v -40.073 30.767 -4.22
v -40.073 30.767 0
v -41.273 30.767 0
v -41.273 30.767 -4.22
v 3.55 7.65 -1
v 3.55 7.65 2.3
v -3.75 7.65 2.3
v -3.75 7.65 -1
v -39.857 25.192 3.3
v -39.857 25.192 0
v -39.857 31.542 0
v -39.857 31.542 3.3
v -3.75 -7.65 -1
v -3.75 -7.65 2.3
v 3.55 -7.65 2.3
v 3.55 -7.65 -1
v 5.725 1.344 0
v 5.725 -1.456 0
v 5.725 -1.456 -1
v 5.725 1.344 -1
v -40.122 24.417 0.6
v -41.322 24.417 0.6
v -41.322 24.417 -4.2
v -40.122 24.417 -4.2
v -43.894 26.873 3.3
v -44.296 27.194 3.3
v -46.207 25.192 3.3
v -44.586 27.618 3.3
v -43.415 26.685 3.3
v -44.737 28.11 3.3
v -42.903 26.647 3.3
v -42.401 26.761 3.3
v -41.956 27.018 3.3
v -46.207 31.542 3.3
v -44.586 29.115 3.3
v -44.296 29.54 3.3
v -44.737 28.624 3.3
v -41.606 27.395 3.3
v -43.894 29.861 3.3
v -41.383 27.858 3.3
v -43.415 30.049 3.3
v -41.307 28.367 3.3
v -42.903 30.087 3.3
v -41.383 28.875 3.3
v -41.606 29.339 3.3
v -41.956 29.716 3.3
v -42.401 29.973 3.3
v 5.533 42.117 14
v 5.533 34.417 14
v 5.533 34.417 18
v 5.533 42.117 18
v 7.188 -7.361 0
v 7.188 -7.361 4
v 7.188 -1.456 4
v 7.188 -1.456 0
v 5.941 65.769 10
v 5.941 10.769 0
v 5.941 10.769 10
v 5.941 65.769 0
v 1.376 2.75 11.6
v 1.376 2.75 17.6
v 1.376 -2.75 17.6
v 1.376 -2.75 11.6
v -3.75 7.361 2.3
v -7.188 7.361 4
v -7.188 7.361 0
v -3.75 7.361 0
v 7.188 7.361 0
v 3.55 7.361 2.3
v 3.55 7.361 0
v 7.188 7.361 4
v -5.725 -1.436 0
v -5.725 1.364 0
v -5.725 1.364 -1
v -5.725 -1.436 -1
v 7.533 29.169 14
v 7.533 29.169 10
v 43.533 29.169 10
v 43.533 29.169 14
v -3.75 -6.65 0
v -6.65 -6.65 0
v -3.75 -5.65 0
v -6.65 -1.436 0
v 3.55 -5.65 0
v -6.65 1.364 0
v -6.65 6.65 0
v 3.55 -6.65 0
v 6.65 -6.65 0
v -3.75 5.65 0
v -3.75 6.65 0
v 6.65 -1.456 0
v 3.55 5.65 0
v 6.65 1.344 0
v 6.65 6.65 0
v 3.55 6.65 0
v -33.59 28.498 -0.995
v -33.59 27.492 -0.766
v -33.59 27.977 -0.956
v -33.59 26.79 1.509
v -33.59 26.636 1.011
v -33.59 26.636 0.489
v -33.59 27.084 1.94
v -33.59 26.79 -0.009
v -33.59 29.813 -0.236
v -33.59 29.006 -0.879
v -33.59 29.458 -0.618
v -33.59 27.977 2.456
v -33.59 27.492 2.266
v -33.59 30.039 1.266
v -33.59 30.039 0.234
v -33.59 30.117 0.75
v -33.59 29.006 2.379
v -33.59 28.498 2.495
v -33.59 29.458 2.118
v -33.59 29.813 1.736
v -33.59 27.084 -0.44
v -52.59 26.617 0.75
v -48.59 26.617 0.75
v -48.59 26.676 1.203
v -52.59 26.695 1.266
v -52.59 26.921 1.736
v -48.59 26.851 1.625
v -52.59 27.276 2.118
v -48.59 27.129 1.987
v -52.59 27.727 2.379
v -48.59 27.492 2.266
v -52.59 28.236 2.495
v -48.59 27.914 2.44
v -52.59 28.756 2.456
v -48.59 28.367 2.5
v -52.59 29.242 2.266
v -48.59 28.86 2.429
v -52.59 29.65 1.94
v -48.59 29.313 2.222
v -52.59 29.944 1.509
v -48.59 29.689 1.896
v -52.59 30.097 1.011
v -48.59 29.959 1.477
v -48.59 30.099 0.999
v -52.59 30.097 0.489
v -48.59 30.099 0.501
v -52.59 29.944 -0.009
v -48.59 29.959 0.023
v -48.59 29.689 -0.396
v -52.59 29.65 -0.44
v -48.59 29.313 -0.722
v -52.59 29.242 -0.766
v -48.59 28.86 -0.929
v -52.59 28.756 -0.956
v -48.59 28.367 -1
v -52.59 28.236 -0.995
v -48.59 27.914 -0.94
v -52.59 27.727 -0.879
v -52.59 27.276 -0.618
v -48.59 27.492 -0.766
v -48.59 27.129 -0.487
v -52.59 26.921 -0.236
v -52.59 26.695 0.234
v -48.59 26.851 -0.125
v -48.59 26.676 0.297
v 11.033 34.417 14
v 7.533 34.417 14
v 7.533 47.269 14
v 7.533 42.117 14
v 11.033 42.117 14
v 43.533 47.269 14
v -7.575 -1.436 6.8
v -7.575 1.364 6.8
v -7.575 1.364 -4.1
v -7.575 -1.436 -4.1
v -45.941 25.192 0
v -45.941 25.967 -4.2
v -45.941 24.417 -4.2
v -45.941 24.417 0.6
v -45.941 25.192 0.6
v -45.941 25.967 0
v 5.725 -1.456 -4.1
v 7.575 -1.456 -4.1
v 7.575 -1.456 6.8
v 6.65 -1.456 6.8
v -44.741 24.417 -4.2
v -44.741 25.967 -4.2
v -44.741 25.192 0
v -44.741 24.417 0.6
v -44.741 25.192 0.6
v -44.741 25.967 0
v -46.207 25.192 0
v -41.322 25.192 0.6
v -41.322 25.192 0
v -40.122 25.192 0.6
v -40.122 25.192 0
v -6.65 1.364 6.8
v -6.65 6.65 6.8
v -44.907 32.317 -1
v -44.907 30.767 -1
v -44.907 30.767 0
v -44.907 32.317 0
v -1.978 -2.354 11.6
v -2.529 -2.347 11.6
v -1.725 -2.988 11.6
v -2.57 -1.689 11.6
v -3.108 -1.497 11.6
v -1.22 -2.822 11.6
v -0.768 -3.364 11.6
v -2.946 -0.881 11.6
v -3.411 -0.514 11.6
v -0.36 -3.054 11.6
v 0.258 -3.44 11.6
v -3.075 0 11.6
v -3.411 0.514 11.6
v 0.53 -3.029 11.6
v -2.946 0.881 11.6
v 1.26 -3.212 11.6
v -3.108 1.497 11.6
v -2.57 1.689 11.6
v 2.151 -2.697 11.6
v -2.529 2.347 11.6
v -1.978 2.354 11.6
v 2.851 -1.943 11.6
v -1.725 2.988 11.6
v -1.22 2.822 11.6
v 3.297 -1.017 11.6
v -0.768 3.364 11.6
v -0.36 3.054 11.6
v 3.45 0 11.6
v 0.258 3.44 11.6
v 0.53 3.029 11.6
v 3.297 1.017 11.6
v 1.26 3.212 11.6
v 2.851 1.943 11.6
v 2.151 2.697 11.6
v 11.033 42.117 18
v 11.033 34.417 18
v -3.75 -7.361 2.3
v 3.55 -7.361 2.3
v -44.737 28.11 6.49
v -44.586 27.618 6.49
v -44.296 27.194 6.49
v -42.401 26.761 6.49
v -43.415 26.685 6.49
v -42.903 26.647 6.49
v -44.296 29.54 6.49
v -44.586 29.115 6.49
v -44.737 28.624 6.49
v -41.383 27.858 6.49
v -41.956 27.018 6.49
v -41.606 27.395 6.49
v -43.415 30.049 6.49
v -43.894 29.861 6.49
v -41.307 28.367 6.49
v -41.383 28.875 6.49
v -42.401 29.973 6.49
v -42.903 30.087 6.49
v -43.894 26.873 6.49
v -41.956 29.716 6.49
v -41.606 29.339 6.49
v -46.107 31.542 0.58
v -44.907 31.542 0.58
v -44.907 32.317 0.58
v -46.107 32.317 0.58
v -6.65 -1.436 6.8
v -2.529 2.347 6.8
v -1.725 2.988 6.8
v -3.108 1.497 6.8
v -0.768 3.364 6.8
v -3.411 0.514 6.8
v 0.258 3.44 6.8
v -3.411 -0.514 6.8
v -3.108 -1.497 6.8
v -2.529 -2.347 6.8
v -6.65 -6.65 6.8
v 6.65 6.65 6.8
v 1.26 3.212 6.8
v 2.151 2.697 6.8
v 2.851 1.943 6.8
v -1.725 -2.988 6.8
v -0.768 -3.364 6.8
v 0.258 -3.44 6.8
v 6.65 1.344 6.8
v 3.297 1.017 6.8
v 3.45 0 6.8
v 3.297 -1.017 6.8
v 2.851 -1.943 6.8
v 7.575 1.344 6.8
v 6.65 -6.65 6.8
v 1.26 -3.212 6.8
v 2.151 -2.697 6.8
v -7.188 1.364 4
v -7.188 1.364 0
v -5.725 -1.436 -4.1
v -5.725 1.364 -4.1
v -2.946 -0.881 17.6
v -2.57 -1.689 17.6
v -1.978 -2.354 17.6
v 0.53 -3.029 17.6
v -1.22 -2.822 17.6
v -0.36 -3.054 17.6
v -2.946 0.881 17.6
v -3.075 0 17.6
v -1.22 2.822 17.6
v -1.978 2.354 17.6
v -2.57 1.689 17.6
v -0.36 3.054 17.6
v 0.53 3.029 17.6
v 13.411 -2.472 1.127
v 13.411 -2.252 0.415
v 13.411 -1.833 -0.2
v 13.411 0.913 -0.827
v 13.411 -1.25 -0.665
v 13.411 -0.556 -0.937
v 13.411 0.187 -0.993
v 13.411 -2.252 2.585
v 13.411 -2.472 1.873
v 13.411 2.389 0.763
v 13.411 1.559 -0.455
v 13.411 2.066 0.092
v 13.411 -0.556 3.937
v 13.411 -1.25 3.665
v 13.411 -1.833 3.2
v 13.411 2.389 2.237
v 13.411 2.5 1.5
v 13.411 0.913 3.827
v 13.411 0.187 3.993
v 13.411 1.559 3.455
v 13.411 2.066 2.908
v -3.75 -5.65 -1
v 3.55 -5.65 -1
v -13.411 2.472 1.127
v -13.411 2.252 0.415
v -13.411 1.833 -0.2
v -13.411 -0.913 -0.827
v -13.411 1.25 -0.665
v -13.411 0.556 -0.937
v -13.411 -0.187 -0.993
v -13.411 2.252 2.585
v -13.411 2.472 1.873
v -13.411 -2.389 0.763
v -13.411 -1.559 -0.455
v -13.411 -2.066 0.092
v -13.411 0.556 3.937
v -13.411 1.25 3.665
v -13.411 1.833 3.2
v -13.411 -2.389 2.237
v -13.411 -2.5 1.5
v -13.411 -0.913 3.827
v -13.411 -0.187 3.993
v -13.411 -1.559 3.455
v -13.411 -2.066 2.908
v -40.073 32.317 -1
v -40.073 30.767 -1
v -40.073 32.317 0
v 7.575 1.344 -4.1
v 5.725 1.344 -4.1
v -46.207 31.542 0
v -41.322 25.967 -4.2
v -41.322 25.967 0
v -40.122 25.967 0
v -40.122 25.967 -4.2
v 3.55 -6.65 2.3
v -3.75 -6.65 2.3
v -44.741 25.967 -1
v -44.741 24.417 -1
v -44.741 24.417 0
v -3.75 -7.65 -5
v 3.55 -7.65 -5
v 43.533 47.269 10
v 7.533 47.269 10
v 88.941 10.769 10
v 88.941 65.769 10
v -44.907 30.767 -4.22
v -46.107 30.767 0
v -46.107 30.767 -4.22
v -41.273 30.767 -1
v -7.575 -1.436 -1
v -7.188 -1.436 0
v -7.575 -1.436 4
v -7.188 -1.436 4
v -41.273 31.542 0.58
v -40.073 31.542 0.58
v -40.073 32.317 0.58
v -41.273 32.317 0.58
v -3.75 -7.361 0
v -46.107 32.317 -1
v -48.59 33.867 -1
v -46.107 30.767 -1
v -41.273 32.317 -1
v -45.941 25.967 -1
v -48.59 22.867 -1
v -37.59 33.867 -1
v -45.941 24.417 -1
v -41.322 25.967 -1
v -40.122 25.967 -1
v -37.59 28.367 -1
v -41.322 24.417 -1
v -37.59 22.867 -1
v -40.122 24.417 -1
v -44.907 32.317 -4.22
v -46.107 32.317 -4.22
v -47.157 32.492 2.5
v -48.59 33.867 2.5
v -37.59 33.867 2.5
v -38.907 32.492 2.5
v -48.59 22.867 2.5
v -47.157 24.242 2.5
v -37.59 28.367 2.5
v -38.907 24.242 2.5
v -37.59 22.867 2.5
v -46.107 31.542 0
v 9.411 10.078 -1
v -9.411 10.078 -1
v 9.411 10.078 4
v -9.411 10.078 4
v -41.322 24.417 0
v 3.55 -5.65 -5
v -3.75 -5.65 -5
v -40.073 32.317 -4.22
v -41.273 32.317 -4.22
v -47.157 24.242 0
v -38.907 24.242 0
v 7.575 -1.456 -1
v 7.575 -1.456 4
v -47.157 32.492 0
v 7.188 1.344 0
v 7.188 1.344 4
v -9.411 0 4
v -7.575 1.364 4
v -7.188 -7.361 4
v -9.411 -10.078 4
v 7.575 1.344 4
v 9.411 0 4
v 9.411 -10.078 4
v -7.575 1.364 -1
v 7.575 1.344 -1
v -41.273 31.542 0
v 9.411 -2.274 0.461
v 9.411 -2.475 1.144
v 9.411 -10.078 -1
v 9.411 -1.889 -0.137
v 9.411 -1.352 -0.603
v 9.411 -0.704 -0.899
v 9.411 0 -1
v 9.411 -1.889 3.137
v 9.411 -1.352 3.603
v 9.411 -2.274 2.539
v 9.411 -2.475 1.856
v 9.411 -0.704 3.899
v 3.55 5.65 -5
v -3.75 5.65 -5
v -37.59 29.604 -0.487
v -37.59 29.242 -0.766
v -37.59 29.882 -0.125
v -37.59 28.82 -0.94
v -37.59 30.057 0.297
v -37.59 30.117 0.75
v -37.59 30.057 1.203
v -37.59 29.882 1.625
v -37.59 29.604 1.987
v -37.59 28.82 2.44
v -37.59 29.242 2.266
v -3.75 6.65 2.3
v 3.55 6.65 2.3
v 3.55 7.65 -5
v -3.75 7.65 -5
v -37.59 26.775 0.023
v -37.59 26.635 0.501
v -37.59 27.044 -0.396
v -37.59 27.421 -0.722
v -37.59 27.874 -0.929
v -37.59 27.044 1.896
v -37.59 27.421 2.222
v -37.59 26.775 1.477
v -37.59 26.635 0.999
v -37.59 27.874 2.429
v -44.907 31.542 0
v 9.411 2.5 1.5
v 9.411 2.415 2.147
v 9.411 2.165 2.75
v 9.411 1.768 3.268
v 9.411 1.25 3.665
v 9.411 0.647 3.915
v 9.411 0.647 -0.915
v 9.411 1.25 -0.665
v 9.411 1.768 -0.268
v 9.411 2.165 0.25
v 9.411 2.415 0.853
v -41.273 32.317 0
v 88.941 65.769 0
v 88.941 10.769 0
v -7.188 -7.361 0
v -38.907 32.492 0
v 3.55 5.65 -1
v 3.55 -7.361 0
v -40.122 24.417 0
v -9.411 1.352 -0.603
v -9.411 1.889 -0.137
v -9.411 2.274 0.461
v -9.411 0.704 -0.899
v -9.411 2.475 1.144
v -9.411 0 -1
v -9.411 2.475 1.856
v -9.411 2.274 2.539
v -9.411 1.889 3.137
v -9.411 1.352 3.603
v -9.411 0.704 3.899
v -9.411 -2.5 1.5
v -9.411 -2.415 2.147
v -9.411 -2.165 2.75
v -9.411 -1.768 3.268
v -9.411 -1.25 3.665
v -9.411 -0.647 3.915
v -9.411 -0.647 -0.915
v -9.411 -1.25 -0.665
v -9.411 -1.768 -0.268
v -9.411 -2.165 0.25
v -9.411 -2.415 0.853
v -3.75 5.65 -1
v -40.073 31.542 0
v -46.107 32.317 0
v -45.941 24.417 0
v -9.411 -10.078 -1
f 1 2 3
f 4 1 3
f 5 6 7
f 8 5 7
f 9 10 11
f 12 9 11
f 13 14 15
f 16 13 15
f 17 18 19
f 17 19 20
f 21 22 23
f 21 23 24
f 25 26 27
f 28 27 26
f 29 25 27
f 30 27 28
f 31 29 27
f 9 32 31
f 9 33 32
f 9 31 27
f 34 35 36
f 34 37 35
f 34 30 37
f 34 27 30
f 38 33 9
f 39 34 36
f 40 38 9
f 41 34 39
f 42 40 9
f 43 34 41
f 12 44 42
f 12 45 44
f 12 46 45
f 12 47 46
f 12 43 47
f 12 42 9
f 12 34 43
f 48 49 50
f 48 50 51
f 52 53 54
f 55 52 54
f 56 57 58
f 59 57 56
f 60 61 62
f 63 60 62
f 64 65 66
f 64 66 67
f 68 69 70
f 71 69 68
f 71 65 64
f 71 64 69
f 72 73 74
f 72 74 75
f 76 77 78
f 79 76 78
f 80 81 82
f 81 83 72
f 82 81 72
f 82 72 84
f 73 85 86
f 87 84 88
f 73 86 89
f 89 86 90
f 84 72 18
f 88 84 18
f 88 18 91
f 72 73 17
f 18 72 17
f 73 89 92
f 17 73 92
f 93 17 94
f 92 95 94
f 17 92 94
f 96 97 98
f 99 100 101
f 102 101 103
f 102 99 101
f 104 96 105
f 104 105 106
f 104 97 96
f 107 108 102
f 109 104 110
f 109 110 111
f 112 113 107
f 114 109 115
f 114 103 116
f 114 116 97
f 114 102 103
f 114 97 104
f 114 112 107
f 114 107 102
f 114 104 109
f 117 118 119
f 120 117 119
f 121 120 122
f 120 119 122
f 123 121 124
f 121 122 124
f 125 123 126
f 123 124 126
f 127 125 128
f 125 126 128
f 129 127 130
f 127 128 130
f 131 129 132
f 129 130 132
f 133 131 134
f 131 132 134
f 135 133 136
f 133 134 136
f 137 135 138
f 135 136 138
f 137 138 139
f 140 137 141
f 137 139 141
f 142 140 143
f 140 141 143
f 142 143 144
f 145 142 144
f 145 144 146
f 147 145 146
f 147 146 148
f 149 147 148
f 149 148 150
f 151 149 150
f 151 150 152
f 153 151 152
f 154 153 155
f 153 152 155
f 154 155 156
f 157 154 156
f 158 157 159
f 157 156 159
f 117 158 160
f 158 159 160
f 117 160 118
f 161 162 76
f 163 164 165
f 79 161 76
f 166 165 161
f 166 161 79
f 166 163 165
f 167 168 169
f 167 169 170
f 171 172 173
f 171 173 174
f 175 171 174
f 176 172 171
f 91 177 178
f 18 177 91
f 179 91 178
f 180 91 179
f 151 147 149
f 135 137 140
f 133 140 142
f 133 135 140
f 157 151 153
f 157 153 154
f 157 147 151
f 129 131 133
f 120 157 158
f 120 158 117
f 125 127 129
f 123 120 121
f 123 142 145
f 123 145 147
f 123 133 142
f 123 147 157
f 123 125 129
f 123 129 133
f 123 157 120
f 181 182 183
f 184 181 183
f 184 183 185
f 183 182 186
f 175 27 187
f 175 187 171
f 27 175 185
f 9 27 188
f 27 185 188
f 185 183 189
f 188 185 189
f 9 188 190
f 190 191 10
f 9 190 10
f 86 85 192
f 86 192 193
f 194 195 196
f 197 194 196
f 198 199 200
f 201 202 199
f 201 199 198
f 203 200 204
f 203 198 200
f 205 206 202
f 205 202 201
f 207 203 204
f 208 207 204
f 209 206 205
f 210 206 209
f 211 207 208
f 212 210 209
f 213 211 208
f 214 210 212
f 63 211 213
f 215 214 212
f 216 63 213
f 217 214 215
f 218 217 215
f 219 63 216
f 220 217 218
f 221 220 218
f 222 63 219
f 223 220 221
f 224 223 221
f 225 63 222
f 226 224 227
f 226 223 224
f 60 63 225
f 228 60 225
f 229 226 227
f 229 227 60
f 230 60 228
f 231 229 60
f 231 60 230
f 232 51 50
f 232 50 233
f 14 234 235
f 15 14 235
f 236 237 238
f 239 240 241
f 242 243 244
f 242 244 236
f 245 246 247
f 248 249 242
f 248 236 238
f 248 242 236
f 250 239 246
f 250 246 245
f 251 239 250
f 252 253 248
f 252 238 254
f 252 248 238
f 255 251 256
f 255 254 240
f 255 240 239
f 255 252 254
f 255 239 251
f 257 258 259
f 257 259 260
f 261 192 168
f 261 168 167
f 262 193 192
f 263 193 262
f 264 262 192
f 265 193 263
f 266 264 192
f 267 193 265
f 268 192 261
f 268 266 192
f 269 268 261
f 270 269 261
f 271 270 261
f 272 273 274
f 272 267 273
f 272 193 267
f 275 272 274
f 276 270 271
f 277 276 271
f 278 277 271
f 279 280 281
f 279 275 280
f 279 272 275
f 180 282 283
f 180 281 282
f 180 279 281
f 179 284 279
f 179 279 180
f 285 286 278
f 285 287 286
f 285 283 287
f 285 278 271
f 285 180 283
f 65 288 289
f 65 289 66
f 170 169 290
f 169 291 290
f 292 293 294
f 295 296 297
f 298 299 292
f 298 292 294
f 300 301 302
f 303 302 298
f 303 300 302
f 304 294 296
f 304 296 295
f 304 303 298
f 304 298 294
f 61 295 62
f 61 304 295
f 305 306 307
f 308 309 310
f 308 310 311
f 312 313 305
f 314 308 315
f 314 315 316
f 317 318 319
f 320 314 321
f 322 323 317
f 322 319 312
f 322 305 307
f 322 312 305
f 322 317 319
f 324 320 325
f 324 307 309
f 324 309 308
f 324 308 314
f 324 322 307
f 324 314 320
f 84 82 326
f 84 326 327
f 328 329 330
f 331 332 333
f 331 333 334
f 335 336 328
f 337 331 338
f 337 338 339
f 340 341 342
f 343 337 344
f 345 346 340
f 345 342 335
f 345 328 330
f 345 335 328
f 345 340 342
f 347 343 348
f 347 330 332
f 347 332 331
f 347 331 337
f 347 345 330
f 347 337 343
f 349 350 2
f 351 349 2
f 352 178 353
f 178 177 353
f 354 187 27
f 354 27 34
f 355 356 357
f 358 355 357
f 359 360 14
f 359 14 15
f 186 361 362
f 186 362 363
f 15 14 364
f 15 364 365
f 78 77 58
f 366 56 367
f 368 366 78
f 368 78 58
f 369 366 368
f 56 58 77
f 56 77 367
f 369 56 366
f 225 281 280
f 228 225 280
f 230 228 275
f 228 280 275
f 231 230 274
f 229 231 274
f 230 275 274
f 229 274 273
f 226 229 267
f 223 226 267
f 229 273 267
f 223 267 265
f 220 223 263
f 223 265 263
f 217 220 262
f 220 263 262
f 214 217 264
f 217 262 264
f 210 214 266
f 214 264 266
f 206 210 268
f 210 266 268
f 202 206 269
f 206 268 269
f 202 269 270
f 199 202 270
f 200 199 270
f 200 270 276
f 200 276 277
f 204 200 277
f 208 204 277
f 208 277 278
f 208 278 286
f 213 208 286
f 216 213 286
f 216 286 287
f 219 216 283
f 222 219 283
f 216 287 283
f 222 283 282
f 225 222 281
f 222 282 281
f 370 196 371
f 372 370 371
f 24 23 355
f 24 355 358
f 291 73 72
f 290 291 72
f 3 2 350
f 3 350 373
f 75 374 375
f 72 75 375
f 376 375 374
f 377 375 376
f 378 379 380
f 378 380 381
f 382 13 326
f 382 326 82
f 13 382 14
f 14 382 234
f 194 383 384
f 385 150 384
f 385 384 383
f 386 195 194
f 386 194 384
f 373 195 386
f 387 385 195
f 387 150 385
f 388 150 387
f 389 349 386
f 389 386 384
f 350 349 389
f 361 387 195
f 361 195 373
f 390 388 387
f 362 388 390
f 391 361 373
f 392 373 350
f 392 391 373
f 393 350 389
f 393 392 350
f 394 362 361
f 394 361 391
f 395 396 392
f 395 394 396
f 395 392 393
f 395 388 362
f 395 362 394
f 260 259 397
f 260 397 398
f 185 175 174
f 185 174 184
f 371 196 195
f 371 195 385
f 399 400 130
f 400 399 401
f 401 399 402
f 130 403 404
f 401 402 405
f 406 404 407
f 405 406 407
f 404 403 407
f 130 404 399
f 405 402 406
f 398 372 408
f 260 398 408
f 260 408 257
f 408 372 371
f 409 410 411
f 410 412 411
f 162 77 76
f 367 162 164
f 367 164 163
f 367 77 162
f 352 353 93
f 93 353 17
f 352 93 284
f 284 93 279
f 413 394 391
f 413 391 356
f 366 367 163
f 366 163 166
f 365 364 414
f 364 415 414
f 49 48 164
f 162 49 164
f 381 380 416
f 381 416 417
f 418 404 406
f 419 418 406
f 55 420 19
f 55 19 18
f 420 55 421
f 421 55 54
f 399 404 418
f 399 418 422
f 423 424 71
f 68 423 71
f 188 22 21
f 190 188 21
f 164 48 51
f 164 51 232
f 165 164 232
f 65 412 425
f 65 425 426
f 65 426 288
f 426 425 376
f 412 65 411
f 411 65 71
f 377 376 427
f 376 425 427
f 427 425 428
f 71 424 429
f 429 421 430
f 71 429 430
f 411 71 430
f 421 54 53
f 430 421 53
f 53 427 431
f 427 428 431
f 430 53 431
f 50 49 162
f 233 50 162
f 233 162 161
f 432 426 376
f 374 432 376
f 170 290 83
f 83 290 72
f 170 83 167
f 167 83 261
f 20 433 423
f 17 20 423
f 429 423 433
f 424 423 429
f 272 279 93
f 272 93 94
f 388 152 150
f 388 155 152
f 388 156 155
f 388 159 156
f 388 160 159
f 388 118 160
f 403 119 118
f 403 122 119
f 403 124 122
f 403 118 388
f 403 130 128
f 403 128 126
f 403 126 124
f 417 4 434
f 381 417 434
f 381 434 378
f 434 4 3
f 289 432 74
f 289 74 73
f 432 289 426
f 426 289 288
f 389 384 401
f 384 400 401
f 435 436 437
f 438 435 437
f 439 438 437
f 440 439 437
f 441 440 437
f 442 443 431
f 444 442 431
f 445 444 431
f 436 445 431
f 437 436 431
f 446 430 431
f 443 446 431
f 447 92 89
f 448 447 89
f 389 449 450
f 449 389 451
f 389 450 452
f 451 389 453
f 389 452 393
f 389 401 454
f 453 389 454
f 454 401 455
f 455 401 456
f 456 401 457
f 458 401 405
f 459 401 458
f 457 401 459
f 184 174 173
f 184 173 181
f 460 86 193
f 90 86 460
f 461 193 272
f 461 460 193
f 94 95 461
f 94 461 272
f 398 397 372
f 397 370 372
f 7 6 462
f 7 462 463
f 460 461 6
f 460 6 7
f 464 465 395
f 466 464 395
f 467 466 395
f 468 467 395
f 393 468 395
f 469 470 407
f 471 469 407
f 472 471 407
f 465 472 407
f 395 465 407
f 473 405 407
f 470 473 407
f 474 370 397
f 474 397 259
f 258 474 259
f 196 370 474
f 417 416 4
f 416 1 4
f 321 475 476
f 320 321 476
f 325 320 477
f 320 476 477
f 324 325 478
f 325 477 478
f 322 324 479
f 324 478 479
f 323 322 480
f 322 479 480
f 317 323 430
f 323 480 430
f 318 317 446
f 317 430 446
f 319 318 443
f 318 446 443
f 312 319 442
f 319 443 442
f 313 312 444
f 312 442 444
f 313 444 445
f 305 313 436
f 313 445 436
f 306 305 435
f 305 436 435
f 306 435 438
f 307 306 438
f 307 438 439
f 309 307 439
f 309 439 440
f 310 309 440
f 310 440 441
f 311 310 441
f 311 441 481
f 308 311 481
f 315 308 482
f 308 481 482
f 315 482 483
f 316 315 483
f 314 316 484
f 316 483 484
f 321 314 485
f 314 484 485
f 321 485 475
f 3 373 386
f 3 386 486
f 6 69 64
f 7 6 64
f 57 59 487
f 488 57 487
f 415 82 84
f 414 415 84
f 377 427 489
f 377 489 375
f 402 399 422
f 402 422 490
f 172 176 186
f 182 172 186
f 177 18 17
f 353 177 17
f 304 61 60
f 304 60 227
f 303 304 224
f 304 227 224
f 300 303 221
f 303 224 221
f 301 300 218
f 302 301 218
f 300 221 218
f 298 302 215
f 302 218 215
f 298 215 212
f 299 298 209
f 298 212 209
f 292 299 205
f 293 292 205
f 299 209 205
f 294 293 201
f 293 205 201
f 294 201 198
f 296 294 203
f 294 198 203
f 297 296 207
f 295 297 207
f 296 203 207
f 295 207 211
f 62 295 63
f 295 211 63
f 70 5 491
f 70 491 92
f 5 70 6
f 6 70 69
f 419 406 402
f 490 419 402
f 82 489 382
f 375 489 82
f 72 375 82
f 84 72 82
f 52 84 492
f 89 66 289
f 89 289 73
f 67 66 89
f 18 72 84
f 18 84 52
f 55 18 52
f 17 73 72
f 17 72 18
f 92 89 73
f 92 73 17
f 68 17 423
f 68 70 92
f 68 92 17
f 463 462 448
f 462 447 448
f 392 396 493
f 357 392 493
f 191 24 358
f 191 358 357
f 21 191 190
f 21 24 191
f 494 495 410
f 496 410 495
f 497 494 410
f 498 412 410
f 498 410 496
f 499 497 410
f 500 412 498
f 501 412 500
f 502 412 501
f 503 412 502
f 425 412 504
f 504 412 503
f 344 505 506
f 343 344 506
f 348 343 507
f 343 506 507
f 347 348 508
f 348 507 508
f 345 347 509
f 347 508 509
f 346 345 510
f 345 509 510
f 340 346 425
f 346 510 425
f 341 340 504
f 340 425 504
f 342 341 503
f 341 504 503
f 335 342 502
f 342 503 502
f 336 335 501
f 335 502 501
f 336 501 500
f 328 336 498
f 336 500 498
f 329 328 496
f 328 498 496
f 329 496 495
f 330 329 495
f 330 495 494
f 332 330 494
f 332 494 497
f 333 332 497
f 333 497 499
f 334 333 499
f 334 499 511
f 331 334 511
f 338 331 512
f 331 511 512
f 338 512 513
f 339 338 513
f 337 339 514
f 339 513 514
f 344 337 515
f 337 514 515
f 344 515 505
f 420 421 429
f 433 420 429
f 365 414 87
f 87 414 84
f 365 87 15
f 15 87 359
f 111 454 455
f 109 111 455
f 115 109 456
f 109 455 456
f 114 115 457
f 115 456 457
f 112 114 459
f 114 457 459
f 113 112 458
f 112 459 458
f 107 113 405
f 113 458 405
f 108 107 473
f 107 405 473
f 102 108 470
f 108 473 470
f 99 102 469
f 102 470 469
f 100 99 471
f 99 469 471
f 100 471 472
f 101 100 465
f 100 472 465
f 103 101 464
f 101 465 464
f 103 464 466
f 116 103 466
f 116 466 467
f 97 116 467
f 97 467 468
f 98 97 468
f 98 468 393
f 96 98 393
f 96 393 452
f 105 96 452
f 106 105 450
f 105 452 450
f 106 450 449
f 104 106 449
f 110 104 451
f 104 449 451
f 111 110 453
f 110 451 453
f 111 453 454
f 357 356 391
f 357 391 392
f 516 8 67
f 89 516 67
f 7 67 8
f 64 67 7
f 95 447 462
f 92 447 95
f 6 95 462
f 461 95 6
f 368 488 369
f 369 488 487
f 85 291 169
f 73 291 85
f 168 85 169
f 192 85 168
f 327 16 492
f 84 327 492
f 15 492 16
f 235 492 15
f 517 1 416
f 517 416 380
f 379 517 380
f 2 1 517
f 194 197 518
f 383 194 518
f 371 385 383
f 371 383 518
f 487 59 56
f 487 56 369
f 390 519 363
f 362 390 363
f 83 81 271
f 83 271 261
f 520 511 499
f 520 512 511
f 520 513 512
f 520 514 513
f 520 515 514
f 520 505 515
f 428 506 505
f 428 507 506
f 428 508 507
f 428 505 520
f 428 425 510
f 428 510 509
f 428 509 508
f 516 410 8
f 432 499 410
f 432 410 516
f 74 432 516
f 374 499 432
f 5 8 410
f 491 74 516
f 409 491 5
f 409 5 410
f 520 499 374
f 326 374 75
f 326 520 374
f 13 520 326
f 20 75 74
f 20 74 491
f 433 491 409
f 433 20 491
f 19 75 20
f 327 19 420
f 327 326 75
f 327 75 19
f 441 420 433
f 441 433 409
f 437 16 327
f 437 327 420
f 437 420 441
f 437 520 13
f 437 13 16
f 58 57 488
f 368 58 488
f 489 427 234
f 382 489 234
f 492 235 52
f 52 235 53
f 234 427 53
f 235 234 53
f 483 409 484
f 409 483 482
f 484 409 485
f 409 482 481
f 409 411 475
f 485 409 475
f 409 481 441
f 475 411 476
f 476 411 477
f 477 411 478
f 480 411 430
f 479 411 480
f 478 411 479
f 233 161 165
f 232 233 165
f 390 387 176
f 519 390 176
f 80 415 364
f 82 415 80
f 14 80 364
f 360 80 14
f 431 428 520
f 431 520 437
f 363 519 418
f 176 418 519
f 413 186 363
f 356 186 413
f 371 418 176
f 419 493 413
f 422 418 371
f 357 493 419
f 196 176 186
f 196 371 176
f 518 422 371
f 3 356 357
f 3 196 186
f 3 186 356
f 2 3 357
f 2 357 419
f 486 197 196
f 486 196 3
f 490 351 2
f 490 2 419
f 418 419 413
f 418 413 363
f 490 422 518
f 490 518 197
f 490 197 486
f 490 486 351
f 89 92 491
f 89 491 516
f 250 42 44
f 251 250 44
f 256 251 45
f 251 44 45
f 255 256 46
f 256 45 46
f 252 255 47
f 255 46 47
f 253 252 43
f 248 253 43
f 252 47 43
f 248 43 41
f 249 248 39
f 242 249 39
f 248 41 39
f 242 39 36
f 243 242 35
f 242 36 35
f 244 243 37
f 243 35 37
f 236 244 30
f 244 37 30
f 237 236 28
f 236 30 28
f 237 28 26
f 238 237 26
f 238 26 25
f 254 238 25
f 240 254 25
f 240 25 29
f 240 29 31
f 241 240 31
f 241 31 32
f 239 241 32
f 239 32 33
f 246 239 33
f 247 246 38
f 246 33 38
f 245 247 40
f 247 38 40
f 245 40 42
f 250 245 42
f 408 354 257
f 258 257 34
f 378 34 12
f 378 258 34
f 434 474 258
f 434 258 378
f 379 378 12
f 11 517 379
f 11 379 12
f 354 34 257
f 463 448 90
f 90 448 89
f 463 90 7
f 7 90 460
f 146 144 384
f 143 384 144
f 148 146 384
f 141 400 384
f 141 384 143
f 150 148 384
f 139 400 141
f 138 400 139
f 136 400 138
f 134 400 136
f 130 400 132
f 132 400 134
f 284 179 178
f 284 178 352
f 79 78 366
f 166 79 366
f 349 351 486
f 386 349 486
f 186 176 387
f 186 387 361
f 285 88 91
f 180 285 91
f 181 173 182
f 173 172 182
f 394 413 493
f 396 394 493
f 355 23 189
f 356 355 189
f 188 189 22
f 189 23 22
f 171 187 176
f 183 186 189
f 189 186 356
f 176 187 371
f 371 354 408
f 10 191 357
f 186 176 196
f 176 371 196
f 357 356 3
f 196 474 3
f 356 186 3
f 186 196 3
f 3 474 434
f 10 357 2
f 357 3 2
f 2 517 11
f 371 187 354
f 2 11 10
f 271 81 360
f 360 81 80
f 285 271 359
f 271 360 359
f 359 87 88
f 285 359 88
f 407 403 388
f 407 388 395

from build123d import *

# Parameters (mm, degrees)
F0_W           = 6.35
F0_H           = 6.35
F1_DEPTH       = 3.3
F3_W           = 1.2
F3_H           = 4.8
F2_W           = 1.2
F2_H           = 4.8
F4_DEPTH       = 0.775
F5_R           = 1.725
F6_DEPTH       = 3.19
F7_W           = 13.3
F7_H           = 13.3
F8_DEPTH       = 6.8
F10_W          = 2.8
F10_H          = 10.9
F9_W           = 2.8
F9_H           = 10.9
F11_DEPTH      = 0.925
F13_W          = 7.3
F13_H          = 7.3
F12_W          = 7.3
F12_H          = 7.3
F14_DEPTH      = 1
F15_R          = 3.45
F16_DEPTH      = 4.8
F17_R          = 3.075
F18_DEPTH      = 6
F20_DEPTH      = 6
F21_W          = 83
F21_H          = 55
F22_DEPTH      = 10
F23_W          = 36
F23_H          = 18.1
F24_DEPTH      = 4
F25_W          = 5.5
F25_H          = 7.7
F26_DEPTH      = 4
F27_W          = 11
F27_H          = 11
F28_DEPTH      = 2.5
F28_DEPTH_BACK = 1
F30_W          = 8.25
F30_H          = 8.25
F31_DEPTH      = 2.5
F32_R          = 1.75
F33_DEPTH      = 4
F34_R          = 1.75
F35_DEPTH      = 4
F36_W          = 18.822548911
F36_H          = 20.1564300805
F37_DEPTH      = 4
F37_DEPTH_BACK = 1
F39_W          = 14.3762780353
F39_H          = 14.7220985964
F40_DEPTH      = 4
F41_R          = 2.5
F42_DEPTH      = 4
F43_R          = 2.5
F44_DEPTH      = 4


with BuildPart() as f1:
    # F0 (on Top) → F1 (new body)
    with BuildSketch(Plane.XY):
        with Locations((-43.0315323174, 28.3668454009)):
            Rectangle(F0_W, F0_H)
    extrude(amount=F1_DEPTH)

    # F3 (on face) + F2 (on face) → F4 (join, symmetric)
    with BuildSketch(Plane(origin=(0, 31.5418454009, 0), x_dir=(-1, 0, 0), z_dir=(0, 1, 0))):
        with Locations((45.50699839, -1.8203162122)):
            Rectangle(F3_W, F3_H)
        with Locations((40.6726454794, -1.8203162122)):
            Rectangle(F3_W, F3_H)
    with BuildSketch(Plane.XZ.offset(-25.1918454009)):
        with Locations((-40.7217028141, -1.8)):
            Rectangle(F2_W, F2_H)
        with Locations((-45.3413618207, -1.8)):
            Rectangle(F2_W, F2_H)
    extrude(amount=F4_DEPTH, both=True, dir=(0, 1, 0))

    # F5 (on face) → F6 (join)
    with BuildSketch(Plane.XY.offset(3.3)):
        with Locations((-43.0315323174, 28.3668454009)):
            Circle(F5_R)
    extrude(amount=F6_DEPTH)


with BuildPart() as f8:
    # F7 (on Top) → F8 (new body)
    with BuildSketch(Plane.XY):
        Rectangle(F7_W, F7_H)
    extrude(amount=F8_DEPTH)

    # F10 (on face) + F9 (on face) → F11 (join, symmetric)
    with BuildSketch(Plane.YZ.offset(6.65)):
        with Locations((-0.0559225006, 1.35)):
            Rectangle(F10_W, F10_H)
    with BuildSketch(Plane(origin=(-6.65, 0, 0), x_dir=(0, -1, 0), z_dir=(-1, 0, 0))):
        with Locations((0.0361891497, 1.35)):
            Rectangle(F9_W, F9_H)
    extrude(amount=F11_DEPTH, both=True, dir=(1, 0, 0))

    # F13 (on face) + F12 (on face) → F14 (join, symmetric)
    with BuildSketch(Plane.XZ.offset(6.65)):
        with Locations((-0.1, -1.35)):
            Rectangle(F13_W, F13_H)
    with BuildSketch(Plane(origin=(0, 6.65, 0), x_dir=(-1, 0, 0), z_dir=(0, 1, 0))):
        with Locations((0.1, -1.35)):
            Rectangle(F12_W, F12_H)
    extrude(amount=F14_DEPTH, both=True, dir=(0, -1, 0))

    # F15 (on face) → F16 (join)
    with BuildSketch(Plane.XY.offset(6.8)):
        Circle(F15_R)
    extrude(amount=F16_DEPTH)

    # F17 (on face) → F18 (join)
    with BuildSketch(Plane.XY.offset(11.6)):
        Circle(F17_R)
    extrude(amount=F18_DEPTH)

    # F19 (on face) → F20 (cut, through all)
    with BuildSketch(Plane.XY.offset(17.6)):
        with BuildLine():
            Line((1.3759087906, 2.75), (1.3759087906, -2.75))
            ThreePointArc((1.3759087906, -2.75), (3.075, 0), (1.3759087906, 2.75))
        make_face()
    extrude(amount=-F20_DEPTH, mode=Mode.SUBTRACT)


with BuildPart() as f22:
    # F21 (on Top) → F22 (new body)
    with BuildSketch(Plane.XY):
        with Locations((47.4412734883, 38.2687970996)):
            Rectangle(F21_W, F21_H)
    extrude(amount=F22_DEPTH)

    # F23 (on face) → F24 (join)
    with BuildSketch(Plane.XY.offset(10)):
        with Locations((25.5328132771, 38.2187970996)):
            Rectangle(F23_W, F23_H)
    extrude(amount=F24_DEPTH)

    # F25 (on face) → F26 (join)
    with BuildSketch(Plane.XY.offset(14)):
        with Locations((8.2833440974, 38.2665689378)):
            Rectangle(F25_W, F25_H)
    extrude(amount=F26_DEPTH)


with BuildPart() as f28:
    # F27 (on face) → F28 (new body, two sides)
    with BuildSketch(Plane(origin=(0, 0, 0), x_dir=(1, 0, 0), z_dir=(0, 0, -1))) as f28_sk:
        with Locations((-43.0898219347, -28.3668454009)):
            Rectangle(F27_W, F27_H)
    extrude(amount=-F28_DEPTH)
    extrude(f28_sk.sketch, amount=F28_DEPTH_BACK)

    # F29: cut F1
    add(f1.part, mode=Mode.SUBTRACT)

    # F30 (on face) → F31 (cut, through all)
    with BuildSketch(Plane.XY.offset(2.5)):
        with Locations((-43.0315323174, 28.3668454009)):
            Rectangle(F30_W, F30_H)
    extrude(amount=-F31_DEPTH, mode=Mode.SUBTRACT)

    # F32 (on face) → F33 (join)
    with BuildSketch(Plane(origin=(-48.5898219347, 0, 0), x_dir=(0, -1, 0), z_dir=(-1, 0, 0))):
        with Locations((-28.3668454009, 0.75)):
            Circle(F32_R)
    extrude(amount=F33_DEPTH)

    # F34 (on face) → F35 (join)
    with BuildSketch(Plane.YZ.offset(-37.5898219347)):
        with Locations((28.3668454009, 0.75)):
            Circle(F34_R)
    extrude(amount=F35_DEPTH)


with BuildPart() as f37:
    # F36 (on face) → F37 (new body, two sides)
    with BuildSketch(Plane(origin=(0, 0, 0), x_dir=(1, 0, 0), z_dir=(0, 0, -1))) as f37_sk:
        Rectangle(F36_W, F36_H)
    extrude(amount=-F37_DEPTH)
    extrude(f37_sk.sketch, amount=F37_DEPTH_BACK)

    # F38: cut F8
    add(f8.part, mode=Mode.SUBTRACT)

    # F39 (on face) → F40 (cut, through all)
    with BuildSketch(Plane.XY.offset(4)):
        Rectangle(F39_W, F39_H)
    extrude(amount=-F40_DEPTH, mode=Mode.SUBTRACT)

    # F41 (on face) → F42 (join)
    with BuildSketch(Plane(origin=(-9.4112744555, 0, 0), x_dir=(0, -1, 0), z_dir=(-1, 0, 0))):
        with Locations((0, 1.5)):
            Circle(F41_R)
    extrude(amount=F42_DEPTH)

    # F43 (on face) → F44 (join)
    with BuildSketch(Plane.YZ.offset(9.4112744555)):
        with Locations((0, 1.5)):
            Circle(F43_R)
    extrude(amount=F44_DEPTH)


solid = Compound([f1.part, f8.part, f22.part, f28.part, f37.part])
